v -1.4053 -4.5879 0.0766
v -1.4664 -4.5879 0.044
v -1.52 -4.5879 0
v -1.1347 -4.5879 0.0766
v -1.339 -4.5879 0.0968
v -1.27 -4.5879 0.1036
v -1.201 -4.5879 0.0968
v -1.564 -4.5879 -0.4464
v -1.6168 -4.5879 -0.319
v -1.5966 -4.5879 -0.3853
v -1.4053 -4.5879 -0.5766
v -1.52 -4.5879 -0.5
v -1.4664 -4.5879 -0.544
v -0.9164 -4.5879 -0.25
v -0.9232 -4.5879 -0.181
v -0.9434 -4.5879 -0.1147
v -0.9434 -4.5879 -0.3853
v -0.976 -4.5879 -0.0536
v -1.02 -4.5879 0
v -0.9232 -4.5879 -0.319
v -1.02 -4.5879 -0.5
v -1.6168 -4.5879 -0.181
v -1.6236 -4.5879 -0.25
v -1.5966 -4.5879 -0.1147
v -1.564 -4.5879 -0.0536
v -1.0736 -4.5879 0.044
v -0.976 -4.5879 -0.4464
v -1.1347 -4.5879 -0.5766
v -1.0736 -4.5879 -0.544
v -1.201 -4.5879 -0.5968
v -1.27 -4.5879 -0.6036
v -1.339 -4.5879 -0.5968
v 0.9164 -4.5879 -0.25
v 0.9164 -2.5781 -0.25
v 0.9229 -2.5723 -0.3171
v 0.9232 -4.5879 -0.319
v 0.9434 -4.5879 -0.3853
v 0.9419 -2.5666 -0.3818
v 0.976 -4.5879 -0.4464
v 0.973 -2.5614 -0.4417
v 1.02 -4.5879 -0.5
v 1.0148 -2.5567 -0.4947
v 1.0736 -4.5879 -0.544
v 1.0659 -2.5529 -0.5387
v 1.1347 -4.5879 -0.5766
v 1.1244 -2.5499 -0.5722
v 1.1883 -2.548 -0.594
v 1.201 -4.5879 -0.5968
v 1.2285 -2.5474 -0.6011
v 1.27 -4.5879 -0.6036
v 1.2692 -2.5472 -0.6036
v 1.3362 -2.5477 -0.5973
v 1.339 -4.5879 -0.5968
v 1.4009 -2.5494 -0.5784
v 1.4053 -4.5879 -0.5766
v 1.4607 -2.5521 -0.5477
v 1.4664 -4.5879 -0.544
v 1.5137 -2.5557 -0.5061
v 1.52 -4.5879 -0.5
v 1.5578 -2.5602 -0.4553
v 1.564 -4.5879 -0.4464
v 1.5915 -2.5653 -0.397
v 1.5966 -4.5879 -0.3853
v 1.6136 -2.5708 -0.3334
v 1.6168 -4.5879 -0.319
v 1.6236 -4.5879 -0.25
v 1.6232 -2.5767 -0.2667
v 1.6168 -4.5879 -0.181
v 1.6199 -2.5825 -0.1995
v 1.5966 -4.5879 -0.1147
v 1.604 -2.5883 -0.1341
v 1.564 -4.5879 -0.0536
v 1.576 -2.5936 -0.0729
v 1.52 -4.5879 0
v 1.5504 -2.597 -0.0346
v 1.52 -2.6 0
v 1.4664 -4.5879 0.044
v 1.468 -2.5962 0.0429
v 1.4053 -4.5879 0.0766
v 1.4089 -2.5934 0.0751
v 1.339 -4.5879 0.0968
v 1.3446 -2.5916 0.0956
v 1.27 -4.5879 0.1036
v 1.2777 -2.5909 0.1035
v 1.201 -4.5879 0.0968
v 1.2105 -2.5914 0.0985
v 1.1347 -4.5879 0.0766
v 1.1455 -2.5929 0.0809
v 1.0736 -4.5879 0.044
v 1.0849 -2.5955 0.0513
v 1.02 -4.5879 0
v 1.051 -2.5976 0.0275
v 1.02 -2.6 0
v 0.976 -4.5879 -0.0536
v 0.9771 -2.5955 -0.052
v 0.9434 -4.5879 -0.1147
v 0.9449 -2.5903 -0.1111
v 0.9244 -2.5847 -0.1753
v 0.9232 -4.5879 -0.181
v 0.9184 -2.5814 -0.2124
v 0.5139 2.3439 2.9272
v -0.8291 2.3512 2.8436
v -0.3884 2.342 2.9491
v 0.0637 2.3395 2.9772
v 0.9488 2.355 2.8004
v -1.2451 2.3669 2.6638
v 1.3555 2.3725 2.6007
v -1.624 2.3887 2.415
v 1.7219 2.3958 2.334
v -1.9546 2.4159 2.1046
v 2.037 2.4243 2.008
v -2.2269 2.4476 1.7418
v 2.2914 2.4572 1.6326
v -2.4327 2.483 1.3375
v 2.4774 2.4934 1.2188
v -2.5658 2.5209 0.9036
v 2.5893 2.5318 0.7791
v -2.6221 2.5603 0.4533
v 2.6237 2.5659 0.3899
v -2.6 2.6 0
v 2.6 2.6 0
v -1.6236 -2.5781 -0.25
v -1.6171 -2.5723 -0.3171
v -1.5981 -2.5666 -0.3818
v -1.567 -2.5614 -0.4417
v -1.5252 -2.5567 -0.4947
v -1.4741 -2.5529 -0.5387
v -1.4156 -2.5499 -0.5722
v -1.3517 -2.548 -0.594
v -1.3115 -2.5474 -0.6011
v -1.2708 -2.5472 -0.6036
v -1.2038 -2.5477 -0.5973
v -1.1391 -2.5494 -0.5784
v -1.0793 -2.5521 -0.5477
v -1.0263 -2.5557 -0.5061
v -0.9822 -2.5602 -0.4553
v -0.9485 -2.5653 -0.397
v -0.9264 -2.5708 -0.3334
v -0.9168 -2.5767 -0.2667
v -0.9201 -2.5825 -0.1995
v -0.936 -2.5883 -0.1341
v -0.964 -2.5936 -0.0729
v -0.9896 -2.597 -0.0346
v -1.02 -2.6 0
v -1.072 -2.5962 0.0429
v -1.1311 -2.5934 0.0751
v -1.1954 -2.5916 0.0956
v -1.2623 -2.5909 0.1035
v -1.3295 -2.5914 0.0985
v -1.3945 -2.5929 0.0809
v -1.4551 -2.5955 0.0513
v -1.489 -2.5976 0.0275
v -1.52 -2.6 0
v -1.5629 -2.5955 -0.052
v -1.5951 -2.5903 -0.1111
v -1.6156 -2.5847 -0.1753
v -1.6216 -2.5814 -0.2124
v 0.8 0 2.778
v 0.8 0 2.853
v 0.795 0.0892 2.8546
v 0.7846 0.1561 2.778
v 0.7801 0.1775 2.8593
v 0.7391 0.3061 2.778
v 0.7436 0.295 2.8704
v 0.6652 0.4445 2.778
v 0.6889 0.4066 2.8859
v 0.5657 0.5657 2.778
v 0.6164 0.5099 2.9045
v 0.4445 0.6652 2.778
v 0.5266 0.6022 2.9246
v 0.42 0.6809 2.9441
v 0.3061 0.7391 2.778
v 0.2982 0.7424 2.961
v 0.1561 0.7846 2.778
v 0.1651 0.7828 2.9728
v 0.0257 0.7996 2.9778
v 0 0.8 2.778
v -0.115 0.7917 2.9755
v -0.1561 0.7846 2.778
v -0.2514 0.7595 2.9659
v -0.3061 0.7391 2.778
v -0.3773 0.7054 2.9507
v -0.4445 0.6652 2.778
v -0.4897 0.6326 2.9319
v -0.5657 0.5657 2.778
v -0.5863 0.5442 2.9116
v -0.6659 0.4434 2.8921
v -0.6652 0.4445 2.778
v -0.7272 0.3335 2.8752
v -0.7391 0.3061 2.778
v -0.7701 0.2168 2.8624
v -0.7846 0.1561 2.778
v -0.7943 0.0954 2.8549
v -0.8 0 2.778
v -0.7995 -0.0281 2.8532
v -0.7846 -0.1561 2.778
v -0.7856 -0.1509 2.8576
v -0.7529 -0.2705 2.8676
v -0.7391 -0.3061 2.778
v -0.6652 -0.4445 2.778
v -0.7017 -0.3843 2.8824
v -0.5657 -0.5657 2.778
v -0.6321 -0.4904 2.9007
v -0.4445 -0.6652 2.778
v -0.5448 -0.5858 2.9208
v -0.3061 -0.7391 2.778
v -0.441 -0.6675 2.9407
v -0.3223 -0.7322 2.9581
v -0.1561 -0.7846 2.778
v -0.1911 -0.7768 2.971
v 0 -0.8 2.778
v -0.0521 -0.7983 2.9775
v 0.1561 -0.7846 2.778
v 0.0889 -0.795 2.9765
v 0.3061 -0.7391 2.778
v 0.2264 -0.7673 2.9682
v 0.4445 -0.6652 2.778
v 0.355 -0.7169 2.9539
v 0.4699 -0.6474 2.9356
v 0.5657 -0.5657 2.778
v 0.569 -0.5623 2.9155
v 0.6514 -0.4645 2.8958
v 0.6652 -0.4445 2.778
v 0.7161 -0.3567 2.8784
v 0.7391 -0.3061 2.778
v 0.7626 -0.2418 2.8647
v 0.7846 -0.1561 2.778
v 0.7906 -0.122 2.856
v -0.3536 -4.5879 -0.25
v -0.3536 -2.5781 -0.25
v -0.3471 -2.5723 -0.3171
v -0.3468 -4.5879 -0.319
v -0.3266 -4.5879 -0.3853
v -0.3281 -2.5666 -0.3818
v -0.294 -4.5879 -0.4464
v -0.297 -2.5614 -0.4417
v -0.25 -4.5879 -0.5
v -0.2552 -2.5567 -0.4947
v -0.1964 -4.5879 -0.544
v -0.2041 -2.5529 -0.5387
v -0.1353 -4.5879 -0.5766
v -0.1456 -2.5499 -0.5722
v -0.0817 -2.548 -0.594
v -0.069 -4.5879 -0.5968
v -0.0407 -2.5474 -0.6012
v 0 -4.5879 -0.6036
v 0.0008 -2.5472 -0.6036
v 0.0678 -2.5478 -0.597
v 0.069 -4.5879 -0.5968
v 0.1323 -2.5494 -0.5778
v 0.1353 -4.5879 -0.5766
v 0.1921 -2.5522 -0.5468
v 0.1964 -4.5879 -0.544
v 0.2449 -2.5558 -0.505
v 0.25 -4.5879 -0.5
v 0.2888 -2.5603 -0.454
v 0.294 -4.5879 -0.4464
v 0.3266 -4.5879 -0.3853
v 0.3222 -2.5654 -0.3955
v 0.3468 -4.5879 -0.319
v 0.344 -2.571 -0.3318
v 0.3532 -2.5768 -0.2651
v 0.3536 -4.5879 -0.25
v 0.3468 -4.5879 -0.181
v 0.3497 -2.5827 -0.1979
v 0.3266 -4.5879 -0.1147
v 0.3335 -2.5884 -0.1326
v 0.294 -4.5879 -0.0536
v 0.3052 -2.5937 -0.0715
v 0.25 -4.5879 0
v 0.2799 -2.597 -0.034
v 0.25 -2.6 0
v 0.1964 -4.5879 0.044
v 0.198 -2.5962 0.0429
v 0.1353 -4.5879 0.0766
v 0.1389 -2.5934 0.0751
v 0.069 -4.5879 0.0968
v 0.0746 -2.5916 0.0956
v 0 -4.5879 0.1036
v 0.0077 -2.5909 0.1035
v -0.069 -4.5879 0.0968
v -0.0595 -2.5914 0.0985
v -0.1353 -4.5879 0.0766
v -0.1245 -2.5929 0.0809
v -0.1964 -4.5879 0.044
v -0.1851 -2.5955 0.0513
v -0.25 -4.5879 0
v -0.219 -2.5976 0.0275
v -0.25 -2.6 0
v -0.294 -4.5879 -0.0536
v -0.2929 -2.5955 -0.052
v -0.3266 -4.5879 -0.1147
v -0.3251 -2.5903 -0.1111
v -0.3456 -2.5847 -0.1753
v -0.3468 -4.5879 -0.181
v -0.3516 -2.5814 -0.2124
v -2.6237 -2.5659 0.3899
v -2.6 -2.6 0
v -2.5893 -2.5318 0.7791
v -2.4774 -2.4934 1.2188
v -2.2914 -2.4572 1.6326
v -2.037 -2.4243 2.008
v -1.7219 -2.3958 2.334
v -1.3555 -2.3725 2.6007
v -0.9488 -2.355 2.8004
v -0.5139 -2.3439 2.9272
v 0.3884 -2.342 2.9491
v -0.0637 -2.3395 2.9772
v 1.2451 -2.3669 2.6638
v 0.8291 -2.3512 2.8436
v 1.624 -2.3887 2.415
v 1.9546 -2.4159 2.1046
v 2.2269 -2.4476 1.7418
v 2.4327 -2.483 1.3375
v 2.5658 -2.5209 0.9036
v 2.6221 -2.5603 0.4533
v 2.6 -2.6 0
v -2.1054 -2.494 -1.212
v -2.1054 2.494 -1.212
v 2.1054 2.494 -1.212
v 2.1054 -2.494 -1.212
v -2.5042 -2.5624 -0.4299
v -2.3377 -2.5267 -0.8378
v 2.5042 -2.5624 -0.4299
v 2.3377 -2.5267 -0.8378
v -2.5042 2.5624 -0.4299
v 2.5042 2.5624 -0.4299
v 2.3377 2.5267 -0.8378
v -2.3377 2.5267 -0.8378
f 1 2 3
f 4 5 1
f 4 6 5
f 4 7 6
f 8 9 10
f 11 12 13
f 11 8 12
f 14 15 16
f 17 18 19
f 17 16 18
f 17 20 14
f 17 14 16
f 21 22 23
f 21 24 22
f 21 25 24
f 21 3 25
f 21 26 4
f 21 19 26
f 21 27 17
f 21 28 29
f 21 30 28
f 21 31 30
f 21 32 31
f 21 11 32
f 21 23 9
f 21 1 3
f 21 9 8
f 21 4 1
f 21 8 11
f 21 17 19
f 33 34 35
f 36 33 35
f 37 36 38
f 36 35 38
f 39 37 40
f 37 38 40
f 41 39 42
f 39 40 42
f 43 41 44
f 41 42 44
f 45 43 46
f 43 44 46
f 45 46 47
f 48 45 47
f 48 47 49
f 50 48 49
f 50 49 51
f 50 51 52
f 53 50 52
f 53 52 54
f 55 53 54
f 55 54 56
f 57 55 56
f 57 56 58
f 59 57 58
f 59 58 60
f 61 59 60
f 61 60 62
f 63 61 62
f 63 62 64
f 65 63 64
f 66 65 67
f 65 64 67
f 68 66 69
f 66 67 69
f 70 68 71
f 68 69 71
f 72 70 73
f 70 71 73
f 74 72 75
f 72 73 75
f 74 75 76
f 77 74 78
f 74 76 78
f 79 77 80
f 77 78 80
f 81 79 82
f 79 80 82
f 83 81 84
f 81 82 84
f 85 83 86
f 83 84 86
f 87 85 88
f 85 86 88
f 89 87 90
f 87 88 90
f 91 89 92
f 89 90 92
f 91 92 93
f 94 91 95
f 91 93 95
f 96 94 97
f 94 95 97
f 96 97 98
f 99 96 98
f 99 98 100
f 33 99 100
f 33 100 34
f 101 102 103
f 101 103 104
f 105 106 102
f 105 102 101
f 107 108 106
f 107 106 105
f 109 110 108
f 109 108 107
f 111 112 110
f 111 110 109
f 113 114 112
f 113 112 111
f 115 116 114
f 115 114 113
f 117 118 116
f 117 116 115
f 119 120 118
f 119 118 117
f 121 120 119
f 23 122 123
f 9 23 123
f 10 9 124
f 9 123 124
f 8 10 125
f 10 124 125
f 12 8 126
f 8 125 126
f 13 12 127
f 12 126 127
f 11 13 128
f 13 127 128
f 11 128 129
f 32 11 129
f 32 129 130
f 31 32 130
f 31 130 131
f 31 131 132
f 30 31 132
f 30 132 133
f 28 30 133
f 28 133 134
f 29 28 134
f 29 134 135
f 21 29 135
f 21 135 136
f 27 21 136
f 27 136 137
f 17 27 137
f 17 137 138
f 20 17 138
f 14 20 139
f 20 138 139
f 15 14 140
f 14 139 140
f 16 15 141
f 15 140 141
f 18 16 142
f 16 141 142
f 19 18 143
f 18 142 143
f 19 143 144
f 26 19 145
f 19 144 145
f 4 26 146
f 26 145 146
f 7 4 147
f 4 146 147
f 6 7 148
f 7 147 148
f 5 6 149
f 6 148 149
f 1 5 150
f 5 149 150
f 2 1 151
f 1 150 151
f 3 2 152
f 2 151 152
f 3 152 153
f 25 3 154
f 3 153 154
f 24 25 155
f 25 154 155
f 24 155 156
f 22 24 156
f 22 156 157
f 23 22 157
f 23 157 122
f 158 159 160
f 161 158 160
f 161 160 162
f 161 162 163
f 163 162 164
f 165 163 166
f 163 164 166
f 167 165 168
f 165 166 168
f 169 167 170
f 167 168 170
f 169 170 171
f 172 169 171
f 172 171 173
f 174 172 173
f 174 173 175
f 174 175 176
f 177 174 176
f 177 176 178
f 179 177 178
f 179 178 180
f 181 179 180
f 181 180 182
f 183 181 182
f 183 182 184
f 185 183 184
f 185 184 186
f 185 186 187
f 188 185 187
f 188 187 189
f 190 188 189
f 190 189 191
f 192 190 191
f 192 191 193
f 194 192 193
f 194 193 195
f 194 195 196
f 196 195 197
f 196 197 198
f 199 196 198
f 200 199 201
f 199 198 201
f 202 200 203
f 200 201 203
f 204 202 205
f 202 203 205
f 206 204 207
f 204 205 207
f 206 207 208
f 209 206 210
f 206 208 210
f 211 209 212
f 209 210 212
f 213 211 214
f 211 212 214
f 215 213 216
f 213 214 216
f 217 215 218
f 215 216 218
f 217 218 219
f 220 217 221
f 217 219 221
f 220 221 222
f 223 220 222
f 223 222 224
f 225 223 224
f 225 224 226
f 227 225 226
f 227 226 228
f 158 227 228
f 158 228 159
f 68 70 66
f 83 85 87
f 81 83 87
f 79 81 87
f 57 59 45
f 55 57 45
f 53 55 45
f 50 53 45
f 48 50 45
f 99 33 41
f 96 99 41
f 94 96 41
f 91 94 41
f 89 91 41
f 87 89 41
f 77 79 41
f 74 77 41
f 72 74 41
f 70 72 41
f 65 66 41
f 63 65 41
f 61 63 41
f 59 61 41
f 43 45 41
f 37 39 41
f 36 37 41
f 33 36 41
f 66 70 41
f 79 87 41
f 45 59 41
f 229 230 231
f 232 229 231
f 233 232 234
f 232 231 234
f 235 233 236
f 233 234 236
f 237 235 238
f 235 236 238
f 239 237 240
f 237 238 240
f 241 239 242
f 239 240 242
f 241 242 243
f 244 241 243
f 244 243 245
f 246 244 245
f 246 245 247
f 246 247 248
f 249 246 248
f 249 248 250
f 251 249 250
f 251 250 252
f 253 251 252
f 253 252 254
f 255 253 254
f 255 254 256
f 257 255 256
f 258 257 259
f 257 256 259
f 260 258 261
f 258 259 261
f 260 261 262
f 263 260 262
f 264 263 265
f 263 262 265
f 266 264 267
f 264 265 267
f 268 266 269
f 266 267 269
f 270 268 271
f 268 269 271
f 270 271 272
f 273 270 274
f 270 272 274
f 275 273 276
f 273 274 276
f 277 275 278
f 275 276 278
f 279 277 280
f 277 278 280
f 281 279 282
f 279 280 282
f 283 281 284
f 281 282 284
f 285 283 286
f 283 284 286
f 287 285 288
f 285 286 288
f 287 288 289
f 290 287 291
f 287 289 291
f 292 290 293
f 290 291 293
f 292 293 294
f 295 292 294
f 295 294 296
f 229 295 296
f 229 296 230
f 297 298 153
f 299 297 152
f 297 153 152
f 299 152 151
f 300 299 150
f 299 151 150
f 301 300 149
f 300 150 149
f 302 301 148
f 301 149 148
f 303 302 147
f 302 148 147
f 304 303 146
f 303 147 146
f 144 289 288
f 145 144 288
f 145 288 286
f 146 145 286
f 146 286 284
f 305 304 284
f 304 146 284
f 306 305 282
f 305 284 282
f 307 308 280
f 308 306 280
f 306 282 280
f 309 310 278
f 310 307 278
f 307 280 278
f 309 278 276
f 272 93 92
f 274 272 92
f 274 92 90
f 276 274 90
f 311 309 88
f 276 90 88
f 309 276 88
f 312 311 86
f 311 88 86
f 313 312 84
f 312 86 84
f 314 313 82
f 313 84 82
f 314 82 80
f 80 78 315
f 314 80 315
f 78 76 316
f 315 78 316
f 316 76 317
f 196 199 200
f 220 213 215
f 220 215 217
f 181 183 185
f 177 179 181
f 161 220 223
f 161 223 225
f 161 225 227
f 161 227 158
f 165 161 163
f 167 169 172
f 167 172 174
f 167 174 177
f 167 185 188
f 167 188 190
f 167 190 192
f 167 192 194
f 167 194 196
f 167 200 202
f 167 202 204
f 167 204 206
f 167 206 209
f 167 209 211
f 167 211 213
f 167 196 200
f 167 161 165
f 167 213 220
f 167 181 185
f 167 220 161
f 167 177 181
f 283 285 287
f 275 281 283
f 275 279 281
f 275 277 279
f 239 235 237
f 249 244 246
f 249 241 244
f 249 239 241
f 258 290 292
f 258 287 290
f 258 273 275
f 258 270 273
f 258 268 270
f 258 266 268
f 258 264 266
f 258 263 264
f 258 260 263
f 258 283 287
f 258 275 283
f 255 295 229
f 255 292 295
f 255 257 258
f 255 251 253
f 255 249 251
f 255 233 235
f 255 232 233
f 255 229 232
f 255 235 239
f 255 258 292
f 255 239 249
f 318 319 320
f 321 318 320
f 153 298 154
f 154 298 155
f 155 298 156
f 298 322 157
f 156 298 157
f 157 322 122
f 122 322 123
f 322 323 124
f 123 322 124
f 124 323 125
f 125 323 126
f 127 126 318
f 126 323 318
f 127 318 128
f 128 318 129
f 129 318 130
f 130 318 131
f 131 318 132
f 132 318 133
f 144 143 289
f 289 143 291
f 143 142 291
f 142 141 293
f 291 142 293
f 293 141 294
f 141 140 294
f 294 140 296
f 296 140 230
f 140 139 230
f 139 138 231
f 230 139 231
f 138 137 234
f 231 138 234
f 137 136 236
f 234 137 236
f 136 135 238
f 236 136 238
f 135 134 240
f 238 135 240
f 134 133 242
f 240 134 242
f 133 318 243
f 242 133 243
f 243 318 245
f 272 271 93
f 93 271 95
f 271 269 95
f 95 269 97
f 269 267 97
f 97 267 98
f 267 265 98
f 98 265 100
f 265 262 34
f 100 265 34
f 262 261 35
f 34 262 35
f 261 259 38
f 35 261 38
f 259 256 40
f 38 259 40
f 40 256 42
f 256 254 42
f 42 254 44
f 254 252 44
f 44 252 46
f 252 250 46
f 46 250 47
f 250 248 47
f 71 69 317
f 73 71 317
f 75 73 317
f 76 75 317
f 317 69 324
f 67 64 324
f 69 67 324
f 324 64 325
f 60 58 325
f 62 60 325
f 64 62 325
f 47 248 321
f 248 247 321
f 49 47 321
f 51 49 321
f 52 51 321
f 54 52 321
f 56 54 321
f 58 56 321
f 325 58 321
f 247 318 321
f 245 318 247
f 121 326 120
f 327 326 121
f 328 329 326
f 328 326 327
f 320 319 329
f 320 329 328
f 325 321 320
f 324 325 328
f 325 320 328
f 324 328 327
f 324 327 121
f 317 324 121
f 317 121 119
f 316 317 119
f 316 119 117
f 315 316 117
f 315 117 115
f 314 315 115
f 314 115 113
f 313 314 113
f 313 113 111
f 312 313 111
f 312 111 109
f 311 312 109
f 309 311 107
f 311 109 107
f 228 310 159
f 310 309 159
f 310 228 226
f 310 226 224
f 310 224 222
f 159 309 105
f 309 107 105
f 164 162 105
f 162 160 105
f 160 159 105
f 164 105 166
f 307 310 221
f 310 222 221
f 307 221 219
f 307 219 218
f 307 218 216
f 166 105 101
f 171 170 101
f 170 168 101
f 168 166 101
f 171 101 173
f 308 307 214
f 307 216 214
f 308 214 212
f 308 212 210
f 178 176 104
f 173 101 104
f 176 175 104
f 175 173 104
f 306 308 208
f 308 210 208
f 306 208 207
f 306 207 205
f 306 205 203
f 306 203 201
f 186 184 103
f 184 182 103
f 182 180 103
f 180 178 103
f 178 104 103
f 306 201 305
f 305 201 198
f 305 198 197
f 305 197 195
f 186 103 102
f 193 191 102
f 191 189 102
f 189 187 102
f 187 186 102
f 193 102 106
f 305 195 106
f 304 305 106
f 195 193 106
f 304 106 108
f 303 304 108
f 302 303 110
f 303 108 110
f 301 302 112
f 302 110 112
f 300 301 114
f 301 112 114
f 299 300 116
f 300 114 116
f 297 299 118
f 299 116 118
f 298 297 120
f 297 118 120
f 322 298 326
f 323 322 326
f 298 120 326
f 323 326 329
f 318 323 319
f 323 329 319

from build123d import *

# Parameters (mm, degrees)
BOSS_EXTRUDE1_DEPTH        = 2.6
SKETCH5_W                  = 11.826356456
SKETCH5_H                  = 5.621169426
CUT_EXTRUDE2_DEPTH         = 1.105635064
SKETCH6_W                  = 11.690711404
SKETCH6_H                  = 7.254613366
CUT_EXTRUDE3_DEPTH         = 5.2
BOSS_EXTRUDE2_START        = -0.052804
SKETCH7_R                  = 0.353553391
BOSS_EXTRUDE2_DEPTH        = 12.752804
SKETCH8_R                  = 0.8
CUT_EXTRUDE4_DEPTH         = 0.2
CROQUIS1_W                 = 6.923561314
CROQUIS1_H                 = 11.497610845
CORTAR_EXTRUIR1_DEPTH      = 5
CORTAR_EXTRUIR1_DEPTH_BACK = 5


with BuildPart() as part:
    # Sketch2 → Boss-Extrude1 (new body, symmetric)
    with BuildSketch(Plane(origin=(0, 0, 0), x_dir=(1, 0, 0), z_dir=(0, 1, 0))):
        with BuildLine():
            Line((-2.105447518, 1.212026432), (2.105447518, 1.212026432))
            ThreePointArc((2.105447518, 1.212026432), (0, -2.977973568), (-2.105447518, 1.212026432))
        make_face()
    extrude(amount=BOSS_EXTRUDE1_DEPTH, both=True)

    # Sketch5 → Cut-Extrude2 (cut, through all)
    with BuildSketch(Plane(origin=(0, 2.580250079, -0.225742631), x_dir=(1, 0, 0), z_dir=(0, 0.996194698, -0.087155743))):
        with Locations((0.924694538, -0.744658901)):
            Rectangle(SKETCH5_W, SKETCH5_H)
    cut_extrude2 = extrude(amount=CUT_EXTRUDE2_DEPTH, mode=Mode.SUBTRACT)

    # Sketch6 → Cut-Extrude3 (cut)
    with BuildSketch(Plane(origin=(0, 2.580250079, 0.225742631), x_dir=(1, 0, 0), z_dir=(0, 0.996194698, 0.087155743))):
        with Locations((0.257342704, -2.465539164)):
            Rectangle(SKETCH6_W, SKETCH6_H)
    cut_extrude3 = extrude(amount=CUT_EXTRUDE3_DEPTH, mode=Mode.SUBTRACT)

    # Mirror1: Cut-Extrude2, Cut-Extrude3 across plane
    add(cut_extrude2.mirror(Plane.ZX), mode=Mode.SUBTRACT)
    add(cut_extrude3.mirror(Plane.ZX), mode=Mode.SUBTRACT)

    # Sketch7 → Boss-Extrude2 (add)
    with BuildSketch(Plane(origin=(0, -2.6, 0), x_dir=(-1, 0, 0), z_dir=(0, -1, 0)).offset(BOSS_EXTRUDE2_START)):
        with Locations((-1.27, 0.25)):
            Circle(SKETCH7_R)
        with Locations((0, 0.25)):
            Circle(SKETCH7_R)
        with Locations((1.27, 0.25)):
            Circle(SKETCH7_R)
    extrude(amount=BOSS_EXTRUDE2_DEPTH)

    # Sketch8 → Cut-Extrude4 (cut)
    with BuildSketch(Plane.XY.offset(2.977973568)):
        Circle(SKETCH8_R)
    extrude(amount=-CUT_EXTRUDE4_DEPTH, mode=Mode.SUBTRACT)

    # Croquis1 → Cortar-Extruir1 (cut, two sides)
    with BuildSketch(Plane(origin=(0, 0, 0), x_dir=(0, 0, -1), z_dir=(1, 0, 0))) as cortar_extruir1_sk:
        with Locations((0.104321276, -10.336671587)):
            Rectangle(CROQUIS1_W, CROQUIS1_H)
    extrude(amount=CORTAR_EXTRUIR1_DEPTH, mode=Mode.SUBTRACT)
    extrude(cortar_extruir1_sk.sketch, amount=-CORTAR_EXTRUIR1_DEPTH_BACK, mode=Mode.SUBTRACT)


solid = part.part
